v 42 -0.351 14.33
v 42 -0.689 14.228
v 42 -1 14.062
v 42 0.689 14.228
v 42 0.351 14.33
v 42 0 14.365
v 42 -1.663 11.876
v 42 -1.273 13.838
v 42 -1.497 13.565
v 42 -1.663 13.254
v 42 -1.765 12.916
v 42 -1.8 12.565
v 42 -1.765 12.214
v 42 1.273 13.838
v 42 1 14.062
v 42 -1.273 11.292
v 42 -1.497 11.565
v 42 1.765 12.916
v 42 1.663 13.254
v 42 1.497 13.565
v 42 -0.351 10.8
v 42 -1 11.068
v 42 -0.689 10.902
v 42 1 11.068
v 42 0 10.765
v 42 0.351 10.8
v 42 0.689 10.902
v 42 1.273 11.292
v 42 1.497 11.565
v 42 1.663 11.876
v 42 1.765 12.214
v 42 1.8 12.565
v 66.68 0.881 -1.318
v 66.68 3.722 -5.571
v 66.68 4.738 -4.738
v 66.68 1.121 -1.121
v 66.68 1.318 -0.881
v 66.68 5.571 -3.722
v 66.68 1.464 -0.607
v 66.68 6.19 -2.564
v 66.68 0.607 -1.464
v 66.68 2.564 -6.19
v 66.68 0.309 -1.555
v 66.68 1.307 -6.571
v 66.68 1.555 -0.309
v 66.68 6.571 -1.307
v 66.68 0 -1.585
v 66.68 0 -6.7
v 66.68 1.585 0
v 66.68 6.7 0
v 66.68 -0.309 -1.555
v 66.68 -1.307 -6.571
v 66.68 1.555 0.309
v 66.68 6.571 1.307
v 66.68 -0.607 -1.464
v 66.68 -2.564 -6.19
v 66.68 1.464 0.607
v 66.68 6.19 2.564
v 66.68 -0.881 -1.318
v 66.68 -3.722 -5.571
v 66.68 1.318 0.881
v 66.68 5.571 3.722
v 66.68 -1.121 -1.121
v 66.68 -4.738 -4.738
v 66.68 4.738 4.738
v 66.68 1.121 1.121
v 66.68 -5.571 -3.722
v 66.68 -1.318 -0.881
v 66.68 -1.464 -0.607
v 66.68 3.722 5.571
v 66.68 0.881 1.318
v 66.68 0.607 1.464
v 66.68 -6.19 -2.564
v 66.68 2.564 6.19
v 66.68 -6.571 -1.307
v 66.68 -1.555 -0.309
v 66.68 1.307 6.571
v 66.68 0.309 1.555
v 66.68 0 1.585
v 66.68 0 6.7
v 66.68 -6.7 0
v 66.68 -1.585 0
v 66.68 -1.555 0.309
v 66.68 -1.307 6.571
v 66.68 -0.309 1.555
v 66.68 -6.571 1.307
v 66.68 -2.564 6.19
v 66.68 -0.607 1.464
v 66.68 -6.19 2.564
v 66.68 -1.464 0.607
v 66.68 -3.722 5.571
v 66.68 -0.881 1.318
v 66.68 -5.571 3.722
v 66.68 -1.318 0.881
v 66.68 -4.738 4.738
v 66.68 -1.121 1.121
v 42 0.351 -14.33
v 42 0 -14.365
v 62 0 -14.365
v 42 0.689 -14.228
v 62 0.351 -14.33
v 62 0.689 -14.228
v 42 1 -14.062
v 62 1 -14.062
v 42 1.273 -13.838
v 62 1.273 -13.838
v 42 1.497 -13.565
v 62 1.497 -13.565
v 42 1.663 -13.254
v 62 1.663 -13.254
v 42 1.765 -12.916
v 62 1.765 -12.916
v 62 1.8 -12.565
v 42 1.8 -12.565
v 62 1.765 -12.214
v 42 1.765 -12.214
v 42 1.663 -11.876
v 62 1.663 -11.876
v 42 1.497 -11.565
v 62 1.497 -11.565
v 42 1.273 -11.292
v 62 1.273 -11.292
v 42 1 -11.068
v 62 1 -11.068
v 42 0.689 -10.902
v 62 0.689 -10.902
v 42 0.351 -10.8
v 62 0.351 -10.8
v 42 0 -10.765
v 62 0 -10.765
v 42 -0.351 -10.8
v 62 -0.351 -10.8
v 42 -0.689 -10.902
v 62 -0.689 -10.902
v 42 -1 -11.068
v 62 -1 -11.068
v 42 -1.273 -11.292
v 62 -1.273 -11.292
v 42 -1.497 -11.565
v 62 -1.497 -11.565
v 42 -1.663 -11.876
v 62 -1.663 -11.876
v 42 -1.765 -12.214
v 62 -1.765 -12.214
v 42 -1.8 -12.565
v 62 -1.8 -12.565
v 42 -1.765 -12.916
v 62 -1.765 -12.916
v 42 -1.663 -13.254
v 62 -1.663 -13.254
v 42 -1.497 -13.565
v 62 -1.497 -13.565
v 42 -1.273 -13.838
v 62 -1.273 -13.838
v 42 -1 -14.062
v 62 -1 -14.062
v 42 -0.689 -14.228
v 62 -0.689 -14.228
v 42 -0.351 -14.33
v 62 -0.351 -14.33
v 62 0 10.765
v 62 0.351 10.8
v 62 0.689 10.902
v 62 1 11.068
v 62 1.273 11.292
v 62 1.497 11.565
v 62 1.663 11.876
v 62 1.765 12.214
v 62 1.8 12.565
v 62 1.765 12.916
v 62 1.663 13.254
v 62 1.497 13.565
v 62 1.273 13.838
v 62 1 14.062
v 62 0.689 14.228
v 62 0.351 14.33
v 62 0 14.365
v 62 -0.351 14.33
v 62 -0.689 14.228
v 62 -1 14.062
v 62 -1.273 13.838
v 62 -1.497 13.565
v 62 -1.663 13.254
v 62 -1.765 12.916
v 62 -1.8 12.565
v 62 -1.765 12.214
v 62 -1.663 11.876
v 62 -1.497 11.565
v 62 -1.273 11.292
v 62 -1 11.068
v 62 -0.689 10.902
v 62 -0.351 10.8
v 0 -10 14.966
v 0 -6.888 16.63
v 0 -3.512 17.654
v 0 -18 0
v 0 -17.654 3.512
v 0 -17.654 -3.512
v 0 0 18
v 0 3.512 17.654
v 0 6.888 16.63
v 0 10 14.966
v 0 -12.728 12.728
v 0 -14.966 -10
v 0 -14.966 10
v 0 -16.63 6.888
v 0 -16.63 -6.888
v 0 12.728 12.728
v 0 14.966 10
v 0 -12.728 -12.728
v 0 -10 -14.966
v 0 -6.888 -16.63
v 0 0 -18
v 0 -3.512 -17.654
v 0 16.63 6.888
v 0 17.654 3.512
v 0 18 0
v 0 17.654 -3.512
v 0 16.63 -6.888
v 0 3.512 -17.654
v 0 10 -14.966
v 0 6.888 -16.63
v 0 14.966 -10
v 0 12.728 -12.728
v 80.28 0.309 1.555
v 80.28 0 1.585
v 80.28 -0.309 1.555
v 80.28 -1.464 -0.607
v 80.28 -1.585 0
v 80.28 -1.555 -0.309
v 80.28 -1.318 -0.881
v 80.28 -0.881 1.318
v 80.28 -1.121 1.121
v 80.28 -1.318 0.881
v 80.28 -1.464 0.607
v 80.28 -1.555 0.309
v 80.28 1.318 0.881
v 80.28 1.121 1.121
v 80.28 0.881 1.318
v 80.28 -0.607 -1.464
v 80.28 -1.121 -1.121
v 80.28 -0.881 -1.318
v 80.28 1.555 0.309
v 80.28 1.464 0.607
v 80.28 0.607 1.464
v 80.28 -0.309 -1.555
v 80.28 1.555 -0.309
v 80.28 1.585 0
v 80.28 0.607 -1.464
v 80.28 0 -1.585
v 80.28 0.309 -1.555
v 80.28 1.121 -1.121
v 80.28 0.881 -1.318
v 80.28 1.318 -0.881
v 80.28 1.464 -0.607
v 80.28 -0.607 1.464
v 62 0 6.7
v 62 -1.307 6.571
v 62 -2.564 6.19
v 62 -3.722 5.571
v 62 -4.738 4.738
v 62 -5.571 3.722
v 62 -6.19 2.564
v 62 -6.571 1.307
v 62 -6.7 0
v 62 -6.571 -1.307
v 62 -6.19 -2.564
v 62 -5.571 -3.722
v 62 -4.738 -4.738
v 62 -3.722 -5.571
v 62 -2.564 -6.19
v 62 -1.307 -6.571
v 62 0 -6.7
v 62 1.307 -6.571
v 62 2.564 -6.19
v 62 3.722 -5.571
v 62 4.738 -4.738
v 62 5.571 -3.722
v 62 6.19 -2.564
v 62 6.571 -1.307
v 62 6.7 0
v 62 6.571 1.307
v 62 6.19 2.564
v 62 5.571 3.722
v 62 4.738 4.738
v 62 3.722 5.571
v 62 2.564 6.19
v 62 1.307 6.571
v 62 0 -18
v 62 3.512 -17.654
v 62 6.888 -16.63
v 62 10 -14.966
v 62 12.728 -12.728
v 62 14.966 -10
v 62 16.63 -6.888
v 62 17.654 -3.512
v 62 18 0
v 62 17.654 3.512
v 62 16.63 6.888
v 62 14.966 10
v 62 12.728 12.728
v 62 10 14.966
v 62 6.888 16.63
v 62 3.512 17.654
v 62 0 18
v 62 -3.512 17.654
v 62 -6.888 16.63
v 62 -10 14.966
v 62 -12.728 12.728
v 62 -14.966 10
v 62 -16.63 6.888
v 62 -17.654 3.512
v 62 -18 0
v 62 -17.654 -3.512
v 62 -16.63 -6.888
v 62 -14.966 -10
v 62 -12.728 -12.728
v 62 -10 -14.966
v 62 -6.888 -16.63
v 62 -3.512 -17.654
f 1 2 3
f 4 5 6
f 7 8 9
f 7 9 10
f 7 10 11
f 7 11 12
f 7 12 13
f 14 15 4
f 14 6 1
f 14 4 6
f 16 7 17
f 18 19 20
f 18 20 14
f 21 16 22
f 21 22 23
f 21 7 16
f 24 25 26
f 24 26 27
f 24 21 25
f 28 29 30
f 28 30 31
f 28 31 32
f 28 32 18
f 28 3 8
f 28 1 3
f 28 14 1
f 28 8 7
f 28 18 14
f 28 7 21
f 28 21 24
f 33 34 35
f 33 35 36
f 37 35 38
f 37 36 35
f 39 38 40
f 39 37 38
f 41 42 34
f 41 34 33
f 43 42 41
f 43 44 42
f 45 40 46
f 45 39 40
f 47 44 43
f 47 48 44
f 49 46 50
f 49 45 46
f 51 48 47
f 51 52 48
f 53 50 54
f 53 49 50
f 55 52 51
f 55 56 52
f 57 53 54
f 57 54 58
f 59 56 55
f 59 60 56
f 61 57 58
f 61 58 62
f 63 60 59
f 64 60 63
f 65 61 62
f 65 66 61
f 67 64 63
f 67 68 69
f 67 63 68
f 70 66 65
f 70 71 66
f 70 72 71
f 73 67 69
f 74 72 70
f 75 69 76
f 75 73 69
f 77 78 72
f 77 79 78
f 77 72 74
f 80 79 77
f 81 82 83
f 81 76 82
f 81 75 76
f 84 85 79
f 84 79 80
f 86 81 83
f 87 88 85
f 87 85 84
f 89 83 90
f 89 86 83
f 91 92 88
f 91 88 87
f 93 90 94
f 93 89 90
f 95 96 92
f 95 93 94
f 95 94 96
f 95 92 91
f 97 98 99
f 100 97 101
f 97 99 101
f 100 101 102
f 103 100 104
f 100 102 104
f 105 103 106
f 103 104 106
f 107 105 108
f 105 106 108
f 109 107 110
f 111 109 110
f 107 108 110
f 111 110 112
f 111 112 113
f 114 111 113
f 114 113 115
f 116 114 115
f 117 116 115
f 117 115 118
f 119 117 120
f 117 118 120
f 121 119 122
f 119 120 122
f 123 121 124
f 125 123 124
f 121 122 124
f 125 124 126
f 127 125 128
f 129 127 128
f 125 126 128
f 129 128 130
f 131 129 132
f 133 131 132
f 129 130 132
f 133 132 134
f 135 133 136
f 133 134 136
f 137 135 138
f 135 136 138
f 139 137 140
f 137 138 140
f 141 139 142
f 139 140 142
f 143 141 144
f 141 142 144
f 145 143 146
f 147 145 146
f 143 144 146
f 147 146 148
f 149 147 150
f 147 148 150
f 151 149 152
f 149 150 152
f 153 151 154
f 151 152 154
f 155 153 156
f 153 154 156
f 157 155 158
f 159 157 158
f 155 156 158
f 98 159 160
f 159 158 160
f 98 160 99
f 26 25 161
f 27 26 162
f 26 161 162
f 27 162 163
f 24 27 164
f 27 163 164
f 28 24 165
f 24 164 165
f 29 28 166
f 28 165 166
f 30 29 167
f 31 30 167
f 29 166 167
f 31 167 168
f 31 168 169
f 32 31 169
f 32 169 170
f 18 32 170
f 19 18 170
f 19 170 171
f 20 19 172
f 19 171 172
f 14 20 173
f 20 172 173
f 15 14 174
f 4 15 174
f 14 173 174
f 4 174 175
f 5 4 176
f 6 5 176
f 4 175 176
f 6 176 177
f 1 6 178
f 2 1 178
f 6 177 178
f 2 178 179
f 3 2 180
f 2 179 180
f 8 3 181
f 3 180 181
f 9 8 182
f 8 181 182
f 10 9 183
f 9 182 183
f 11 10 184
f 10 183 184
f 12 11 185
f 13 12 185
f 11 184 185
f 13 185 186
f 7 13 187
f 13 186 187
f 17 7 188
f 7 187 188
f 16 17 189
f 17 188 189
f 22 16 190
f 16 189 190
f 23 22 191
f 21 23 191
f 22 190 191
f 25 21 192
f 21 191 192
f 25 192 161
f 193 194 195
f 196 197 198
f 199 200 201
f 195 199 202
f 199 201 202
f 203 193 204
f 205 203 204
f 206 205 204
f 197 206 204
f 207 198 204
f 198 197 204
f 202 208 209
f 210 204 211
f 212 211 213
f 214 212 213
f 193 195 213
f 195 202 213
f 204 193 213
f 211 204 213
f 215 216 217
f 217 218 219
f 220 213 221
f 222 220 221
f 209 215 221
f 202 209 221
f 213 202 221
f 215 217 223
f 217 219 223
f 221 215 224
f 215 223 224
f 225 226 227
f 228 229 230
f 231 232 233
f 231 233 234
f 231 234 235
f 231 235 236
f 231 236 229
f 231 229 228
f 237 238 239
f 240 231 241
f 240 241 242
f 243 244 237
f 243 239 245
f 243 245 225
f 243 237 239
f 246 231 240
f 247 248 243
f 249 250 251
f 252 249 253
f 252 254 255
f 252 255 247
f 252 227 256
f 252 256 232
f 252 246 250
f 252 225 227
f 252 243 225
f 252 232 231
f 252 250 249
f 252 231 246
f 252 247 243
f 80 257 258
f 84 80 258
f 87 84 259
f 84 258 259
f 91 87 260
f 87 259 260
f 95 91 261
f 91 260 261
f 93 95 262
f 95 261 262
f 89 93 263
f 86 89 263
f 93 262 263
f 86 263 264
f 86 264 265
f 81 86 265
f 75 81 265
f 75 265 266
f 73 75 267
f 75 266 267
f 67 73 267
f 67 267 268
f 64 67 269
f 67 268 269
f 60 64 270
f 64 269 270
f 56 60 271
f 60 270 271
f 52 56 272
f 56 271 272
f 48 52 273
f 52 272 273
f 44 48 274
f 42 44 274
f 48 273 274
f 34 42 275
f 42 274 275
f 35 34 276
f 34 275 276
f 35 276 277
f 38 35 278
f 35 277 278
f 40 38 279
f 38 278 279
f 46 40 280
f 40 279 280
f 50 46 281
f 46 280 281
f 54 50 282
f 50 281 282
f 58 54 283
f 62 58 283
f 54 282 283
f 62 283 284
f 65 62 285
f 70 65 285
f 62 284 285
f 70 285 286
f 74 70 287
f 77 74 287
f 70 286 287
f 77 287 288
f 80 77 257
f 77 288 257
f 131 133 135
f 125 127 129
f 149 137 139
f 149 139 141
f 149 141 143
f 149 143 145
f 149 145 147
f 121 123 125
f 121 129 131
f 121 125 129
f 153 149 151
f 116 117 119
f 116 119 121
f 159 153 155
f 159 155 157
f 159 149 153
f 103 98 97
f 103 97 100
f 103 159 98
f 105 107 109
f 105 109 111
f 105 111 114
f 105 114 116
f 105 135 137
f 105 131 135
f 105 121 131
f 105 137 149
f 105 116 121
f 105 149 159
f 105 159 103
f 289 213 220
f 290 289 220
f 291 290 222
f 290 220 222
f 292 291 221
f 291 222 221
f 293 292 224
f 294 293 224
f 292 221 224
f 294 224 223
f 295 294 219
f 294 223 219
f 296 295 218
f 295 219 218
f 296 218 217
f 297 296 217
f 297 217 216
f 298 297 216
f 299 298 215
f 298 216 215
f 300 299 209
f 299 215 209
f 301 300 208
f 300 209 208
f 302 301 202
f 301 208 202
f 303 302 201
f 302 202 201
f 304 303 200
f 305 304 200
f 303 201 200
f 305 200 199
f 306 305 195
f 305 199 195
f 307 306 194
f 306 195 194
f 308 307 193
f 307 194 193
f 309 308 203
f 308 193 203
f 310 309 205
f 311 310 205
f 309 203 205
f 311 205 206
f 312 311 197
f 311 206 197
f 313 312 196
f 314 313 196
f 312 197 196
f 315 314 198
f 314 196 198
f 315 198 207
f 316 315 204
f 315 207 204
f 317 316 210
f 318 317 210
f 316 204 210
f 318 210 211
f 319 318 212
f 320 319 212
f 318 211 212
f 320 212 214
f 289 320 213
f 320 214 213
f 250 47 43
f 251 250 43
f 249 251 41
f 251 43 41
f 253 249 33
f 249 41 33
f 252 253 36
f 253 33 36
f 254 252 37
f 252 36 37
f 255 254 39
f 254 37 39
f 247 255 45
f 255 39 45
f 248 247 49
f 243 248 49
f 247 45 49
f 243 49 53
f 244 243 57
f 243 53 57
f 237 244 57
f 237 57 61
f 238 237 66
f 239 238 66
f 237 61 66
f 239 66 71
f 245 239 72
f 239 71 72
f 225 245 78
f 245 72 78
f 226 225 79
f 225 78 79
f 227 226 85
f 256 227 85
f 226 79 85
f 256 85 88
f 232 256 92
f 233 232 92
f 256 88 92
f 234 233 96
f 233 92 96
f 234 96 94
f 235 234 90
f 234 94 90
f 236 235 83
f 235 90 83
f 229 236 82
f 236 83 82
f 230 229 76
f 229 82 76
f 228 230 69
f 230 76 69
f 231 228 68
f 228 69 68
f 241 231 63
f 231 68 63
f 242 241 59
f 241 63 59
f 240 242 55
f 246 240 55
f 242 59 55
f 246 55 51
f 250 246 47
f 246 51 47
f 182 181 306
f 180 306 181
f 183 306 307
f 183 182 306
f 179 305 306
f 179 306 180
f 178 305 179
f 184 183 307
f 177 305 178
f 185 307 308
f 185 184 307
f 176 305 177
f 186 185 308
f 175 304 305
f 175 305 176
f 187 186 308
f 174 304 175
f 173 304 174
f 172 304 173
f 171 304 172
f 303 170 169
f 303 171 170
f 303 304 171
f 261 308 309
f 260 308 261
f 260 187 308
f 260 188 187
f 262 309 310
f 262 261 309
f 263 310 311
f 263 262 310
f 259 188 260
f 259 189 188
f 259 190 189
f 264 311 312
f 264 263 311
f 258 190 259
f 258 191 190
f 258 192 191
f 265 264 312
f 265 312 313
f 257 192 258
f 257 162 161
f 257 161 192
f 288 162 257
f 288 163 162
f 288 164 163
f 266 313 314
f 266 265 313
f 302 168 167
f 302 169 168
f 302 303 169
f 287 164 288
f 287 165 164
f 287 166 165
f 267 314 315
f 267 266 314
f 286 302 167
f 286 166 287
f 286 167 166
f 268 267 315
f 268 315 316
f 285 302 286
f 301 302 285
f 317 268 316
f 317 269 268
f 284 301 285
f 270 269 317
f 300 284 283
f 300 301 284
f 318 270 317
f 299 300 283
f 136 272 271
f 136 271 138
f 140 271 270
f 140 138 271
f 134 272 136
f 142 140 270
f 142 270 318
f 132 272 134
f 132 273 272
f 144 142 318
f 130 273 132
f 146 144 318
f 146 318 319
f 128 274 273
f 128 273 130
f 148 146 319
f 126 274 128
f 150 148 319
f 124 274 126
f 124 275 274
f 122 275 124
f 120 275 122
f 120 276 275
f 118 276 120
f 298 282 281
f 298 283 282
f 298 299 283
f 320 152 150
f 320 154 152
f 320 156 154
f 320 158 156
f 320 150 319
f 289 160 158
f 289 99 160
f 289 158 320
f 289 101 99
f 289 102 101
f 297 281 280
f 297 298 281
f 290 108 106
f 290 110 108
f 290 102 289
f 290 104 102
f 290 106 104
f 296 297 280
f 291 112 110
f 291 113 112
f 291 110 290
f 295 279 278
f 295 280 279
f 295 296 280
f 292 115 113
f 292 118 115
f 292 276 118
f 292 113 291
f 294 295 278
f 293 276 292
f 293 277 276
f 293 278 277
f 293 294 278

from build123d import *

# Parameters (mm, degrees)
SKETCH1_R           = 18
BOSS_EXTRUDE1_DEPTH = 62
SKETCH2_R           = 6.7
BOSS_EXTRUDE2_DEPTH = 4.68
SKETCH3_R           = 1.585
BOSS_EXTRUDE3_DEPTH = 13.6
SKETCH4_R           = 1.8
CUT_EXTRUDE1_DEPTH  = 20


with BuildPart() as part:
    # Sketch1 → Boss-Extrude1 (new body)
    with BuildSketch(Plane(origin=(0, 0, 0), x_dir=(0, 0, -1), z_dir=(1, 0, 0))):
        Circle(SKETCH1_R)
    extrude(amount=BOSS_EXTRUDE1_DEPTH)

    # Sketch2 → Boss-Extrude2 (add)
    with BuildSketch(Plane(origin=(62, 0, 0), x_dir=(0, 0, -1), z_dir=(1, 0, 0))):
        with Locations(Location((0, 0, 0), (0, 0, 180))):
            Circle(SKETCH2_R)
    extrude(amount=BOSS_EXTRUDE2_DEPTH)

    # Sketch3 → Boss-Extrude3 (add)
    with BuildSketch(Plane(origin=(66.68, 0, 0), x_dir=(0, 0, -1), z_dir=(1, 0, 0))):
        Circle(SKETCH3_R)
    extrude(amount=BOSS_EXTRUDE3_DEPTH)

    # Sketch4 → Cut-Extrude1 (cut)
    with BuildSketch(Plane(origin=(62, 0, 0), x_dir=(0, 0, -1), z_dir=(1, 0, 0))):
        with Locations((-12.565, 0)):
            Circle(SKETCH4_R)
        with Locations((12.565, 0)):
            Circle(SKETCH4_R)
    extrude(amount=-CUT_EXTRUDE1_DEPTH, mode=Mode.SUBTRACT)


solid = part.part
